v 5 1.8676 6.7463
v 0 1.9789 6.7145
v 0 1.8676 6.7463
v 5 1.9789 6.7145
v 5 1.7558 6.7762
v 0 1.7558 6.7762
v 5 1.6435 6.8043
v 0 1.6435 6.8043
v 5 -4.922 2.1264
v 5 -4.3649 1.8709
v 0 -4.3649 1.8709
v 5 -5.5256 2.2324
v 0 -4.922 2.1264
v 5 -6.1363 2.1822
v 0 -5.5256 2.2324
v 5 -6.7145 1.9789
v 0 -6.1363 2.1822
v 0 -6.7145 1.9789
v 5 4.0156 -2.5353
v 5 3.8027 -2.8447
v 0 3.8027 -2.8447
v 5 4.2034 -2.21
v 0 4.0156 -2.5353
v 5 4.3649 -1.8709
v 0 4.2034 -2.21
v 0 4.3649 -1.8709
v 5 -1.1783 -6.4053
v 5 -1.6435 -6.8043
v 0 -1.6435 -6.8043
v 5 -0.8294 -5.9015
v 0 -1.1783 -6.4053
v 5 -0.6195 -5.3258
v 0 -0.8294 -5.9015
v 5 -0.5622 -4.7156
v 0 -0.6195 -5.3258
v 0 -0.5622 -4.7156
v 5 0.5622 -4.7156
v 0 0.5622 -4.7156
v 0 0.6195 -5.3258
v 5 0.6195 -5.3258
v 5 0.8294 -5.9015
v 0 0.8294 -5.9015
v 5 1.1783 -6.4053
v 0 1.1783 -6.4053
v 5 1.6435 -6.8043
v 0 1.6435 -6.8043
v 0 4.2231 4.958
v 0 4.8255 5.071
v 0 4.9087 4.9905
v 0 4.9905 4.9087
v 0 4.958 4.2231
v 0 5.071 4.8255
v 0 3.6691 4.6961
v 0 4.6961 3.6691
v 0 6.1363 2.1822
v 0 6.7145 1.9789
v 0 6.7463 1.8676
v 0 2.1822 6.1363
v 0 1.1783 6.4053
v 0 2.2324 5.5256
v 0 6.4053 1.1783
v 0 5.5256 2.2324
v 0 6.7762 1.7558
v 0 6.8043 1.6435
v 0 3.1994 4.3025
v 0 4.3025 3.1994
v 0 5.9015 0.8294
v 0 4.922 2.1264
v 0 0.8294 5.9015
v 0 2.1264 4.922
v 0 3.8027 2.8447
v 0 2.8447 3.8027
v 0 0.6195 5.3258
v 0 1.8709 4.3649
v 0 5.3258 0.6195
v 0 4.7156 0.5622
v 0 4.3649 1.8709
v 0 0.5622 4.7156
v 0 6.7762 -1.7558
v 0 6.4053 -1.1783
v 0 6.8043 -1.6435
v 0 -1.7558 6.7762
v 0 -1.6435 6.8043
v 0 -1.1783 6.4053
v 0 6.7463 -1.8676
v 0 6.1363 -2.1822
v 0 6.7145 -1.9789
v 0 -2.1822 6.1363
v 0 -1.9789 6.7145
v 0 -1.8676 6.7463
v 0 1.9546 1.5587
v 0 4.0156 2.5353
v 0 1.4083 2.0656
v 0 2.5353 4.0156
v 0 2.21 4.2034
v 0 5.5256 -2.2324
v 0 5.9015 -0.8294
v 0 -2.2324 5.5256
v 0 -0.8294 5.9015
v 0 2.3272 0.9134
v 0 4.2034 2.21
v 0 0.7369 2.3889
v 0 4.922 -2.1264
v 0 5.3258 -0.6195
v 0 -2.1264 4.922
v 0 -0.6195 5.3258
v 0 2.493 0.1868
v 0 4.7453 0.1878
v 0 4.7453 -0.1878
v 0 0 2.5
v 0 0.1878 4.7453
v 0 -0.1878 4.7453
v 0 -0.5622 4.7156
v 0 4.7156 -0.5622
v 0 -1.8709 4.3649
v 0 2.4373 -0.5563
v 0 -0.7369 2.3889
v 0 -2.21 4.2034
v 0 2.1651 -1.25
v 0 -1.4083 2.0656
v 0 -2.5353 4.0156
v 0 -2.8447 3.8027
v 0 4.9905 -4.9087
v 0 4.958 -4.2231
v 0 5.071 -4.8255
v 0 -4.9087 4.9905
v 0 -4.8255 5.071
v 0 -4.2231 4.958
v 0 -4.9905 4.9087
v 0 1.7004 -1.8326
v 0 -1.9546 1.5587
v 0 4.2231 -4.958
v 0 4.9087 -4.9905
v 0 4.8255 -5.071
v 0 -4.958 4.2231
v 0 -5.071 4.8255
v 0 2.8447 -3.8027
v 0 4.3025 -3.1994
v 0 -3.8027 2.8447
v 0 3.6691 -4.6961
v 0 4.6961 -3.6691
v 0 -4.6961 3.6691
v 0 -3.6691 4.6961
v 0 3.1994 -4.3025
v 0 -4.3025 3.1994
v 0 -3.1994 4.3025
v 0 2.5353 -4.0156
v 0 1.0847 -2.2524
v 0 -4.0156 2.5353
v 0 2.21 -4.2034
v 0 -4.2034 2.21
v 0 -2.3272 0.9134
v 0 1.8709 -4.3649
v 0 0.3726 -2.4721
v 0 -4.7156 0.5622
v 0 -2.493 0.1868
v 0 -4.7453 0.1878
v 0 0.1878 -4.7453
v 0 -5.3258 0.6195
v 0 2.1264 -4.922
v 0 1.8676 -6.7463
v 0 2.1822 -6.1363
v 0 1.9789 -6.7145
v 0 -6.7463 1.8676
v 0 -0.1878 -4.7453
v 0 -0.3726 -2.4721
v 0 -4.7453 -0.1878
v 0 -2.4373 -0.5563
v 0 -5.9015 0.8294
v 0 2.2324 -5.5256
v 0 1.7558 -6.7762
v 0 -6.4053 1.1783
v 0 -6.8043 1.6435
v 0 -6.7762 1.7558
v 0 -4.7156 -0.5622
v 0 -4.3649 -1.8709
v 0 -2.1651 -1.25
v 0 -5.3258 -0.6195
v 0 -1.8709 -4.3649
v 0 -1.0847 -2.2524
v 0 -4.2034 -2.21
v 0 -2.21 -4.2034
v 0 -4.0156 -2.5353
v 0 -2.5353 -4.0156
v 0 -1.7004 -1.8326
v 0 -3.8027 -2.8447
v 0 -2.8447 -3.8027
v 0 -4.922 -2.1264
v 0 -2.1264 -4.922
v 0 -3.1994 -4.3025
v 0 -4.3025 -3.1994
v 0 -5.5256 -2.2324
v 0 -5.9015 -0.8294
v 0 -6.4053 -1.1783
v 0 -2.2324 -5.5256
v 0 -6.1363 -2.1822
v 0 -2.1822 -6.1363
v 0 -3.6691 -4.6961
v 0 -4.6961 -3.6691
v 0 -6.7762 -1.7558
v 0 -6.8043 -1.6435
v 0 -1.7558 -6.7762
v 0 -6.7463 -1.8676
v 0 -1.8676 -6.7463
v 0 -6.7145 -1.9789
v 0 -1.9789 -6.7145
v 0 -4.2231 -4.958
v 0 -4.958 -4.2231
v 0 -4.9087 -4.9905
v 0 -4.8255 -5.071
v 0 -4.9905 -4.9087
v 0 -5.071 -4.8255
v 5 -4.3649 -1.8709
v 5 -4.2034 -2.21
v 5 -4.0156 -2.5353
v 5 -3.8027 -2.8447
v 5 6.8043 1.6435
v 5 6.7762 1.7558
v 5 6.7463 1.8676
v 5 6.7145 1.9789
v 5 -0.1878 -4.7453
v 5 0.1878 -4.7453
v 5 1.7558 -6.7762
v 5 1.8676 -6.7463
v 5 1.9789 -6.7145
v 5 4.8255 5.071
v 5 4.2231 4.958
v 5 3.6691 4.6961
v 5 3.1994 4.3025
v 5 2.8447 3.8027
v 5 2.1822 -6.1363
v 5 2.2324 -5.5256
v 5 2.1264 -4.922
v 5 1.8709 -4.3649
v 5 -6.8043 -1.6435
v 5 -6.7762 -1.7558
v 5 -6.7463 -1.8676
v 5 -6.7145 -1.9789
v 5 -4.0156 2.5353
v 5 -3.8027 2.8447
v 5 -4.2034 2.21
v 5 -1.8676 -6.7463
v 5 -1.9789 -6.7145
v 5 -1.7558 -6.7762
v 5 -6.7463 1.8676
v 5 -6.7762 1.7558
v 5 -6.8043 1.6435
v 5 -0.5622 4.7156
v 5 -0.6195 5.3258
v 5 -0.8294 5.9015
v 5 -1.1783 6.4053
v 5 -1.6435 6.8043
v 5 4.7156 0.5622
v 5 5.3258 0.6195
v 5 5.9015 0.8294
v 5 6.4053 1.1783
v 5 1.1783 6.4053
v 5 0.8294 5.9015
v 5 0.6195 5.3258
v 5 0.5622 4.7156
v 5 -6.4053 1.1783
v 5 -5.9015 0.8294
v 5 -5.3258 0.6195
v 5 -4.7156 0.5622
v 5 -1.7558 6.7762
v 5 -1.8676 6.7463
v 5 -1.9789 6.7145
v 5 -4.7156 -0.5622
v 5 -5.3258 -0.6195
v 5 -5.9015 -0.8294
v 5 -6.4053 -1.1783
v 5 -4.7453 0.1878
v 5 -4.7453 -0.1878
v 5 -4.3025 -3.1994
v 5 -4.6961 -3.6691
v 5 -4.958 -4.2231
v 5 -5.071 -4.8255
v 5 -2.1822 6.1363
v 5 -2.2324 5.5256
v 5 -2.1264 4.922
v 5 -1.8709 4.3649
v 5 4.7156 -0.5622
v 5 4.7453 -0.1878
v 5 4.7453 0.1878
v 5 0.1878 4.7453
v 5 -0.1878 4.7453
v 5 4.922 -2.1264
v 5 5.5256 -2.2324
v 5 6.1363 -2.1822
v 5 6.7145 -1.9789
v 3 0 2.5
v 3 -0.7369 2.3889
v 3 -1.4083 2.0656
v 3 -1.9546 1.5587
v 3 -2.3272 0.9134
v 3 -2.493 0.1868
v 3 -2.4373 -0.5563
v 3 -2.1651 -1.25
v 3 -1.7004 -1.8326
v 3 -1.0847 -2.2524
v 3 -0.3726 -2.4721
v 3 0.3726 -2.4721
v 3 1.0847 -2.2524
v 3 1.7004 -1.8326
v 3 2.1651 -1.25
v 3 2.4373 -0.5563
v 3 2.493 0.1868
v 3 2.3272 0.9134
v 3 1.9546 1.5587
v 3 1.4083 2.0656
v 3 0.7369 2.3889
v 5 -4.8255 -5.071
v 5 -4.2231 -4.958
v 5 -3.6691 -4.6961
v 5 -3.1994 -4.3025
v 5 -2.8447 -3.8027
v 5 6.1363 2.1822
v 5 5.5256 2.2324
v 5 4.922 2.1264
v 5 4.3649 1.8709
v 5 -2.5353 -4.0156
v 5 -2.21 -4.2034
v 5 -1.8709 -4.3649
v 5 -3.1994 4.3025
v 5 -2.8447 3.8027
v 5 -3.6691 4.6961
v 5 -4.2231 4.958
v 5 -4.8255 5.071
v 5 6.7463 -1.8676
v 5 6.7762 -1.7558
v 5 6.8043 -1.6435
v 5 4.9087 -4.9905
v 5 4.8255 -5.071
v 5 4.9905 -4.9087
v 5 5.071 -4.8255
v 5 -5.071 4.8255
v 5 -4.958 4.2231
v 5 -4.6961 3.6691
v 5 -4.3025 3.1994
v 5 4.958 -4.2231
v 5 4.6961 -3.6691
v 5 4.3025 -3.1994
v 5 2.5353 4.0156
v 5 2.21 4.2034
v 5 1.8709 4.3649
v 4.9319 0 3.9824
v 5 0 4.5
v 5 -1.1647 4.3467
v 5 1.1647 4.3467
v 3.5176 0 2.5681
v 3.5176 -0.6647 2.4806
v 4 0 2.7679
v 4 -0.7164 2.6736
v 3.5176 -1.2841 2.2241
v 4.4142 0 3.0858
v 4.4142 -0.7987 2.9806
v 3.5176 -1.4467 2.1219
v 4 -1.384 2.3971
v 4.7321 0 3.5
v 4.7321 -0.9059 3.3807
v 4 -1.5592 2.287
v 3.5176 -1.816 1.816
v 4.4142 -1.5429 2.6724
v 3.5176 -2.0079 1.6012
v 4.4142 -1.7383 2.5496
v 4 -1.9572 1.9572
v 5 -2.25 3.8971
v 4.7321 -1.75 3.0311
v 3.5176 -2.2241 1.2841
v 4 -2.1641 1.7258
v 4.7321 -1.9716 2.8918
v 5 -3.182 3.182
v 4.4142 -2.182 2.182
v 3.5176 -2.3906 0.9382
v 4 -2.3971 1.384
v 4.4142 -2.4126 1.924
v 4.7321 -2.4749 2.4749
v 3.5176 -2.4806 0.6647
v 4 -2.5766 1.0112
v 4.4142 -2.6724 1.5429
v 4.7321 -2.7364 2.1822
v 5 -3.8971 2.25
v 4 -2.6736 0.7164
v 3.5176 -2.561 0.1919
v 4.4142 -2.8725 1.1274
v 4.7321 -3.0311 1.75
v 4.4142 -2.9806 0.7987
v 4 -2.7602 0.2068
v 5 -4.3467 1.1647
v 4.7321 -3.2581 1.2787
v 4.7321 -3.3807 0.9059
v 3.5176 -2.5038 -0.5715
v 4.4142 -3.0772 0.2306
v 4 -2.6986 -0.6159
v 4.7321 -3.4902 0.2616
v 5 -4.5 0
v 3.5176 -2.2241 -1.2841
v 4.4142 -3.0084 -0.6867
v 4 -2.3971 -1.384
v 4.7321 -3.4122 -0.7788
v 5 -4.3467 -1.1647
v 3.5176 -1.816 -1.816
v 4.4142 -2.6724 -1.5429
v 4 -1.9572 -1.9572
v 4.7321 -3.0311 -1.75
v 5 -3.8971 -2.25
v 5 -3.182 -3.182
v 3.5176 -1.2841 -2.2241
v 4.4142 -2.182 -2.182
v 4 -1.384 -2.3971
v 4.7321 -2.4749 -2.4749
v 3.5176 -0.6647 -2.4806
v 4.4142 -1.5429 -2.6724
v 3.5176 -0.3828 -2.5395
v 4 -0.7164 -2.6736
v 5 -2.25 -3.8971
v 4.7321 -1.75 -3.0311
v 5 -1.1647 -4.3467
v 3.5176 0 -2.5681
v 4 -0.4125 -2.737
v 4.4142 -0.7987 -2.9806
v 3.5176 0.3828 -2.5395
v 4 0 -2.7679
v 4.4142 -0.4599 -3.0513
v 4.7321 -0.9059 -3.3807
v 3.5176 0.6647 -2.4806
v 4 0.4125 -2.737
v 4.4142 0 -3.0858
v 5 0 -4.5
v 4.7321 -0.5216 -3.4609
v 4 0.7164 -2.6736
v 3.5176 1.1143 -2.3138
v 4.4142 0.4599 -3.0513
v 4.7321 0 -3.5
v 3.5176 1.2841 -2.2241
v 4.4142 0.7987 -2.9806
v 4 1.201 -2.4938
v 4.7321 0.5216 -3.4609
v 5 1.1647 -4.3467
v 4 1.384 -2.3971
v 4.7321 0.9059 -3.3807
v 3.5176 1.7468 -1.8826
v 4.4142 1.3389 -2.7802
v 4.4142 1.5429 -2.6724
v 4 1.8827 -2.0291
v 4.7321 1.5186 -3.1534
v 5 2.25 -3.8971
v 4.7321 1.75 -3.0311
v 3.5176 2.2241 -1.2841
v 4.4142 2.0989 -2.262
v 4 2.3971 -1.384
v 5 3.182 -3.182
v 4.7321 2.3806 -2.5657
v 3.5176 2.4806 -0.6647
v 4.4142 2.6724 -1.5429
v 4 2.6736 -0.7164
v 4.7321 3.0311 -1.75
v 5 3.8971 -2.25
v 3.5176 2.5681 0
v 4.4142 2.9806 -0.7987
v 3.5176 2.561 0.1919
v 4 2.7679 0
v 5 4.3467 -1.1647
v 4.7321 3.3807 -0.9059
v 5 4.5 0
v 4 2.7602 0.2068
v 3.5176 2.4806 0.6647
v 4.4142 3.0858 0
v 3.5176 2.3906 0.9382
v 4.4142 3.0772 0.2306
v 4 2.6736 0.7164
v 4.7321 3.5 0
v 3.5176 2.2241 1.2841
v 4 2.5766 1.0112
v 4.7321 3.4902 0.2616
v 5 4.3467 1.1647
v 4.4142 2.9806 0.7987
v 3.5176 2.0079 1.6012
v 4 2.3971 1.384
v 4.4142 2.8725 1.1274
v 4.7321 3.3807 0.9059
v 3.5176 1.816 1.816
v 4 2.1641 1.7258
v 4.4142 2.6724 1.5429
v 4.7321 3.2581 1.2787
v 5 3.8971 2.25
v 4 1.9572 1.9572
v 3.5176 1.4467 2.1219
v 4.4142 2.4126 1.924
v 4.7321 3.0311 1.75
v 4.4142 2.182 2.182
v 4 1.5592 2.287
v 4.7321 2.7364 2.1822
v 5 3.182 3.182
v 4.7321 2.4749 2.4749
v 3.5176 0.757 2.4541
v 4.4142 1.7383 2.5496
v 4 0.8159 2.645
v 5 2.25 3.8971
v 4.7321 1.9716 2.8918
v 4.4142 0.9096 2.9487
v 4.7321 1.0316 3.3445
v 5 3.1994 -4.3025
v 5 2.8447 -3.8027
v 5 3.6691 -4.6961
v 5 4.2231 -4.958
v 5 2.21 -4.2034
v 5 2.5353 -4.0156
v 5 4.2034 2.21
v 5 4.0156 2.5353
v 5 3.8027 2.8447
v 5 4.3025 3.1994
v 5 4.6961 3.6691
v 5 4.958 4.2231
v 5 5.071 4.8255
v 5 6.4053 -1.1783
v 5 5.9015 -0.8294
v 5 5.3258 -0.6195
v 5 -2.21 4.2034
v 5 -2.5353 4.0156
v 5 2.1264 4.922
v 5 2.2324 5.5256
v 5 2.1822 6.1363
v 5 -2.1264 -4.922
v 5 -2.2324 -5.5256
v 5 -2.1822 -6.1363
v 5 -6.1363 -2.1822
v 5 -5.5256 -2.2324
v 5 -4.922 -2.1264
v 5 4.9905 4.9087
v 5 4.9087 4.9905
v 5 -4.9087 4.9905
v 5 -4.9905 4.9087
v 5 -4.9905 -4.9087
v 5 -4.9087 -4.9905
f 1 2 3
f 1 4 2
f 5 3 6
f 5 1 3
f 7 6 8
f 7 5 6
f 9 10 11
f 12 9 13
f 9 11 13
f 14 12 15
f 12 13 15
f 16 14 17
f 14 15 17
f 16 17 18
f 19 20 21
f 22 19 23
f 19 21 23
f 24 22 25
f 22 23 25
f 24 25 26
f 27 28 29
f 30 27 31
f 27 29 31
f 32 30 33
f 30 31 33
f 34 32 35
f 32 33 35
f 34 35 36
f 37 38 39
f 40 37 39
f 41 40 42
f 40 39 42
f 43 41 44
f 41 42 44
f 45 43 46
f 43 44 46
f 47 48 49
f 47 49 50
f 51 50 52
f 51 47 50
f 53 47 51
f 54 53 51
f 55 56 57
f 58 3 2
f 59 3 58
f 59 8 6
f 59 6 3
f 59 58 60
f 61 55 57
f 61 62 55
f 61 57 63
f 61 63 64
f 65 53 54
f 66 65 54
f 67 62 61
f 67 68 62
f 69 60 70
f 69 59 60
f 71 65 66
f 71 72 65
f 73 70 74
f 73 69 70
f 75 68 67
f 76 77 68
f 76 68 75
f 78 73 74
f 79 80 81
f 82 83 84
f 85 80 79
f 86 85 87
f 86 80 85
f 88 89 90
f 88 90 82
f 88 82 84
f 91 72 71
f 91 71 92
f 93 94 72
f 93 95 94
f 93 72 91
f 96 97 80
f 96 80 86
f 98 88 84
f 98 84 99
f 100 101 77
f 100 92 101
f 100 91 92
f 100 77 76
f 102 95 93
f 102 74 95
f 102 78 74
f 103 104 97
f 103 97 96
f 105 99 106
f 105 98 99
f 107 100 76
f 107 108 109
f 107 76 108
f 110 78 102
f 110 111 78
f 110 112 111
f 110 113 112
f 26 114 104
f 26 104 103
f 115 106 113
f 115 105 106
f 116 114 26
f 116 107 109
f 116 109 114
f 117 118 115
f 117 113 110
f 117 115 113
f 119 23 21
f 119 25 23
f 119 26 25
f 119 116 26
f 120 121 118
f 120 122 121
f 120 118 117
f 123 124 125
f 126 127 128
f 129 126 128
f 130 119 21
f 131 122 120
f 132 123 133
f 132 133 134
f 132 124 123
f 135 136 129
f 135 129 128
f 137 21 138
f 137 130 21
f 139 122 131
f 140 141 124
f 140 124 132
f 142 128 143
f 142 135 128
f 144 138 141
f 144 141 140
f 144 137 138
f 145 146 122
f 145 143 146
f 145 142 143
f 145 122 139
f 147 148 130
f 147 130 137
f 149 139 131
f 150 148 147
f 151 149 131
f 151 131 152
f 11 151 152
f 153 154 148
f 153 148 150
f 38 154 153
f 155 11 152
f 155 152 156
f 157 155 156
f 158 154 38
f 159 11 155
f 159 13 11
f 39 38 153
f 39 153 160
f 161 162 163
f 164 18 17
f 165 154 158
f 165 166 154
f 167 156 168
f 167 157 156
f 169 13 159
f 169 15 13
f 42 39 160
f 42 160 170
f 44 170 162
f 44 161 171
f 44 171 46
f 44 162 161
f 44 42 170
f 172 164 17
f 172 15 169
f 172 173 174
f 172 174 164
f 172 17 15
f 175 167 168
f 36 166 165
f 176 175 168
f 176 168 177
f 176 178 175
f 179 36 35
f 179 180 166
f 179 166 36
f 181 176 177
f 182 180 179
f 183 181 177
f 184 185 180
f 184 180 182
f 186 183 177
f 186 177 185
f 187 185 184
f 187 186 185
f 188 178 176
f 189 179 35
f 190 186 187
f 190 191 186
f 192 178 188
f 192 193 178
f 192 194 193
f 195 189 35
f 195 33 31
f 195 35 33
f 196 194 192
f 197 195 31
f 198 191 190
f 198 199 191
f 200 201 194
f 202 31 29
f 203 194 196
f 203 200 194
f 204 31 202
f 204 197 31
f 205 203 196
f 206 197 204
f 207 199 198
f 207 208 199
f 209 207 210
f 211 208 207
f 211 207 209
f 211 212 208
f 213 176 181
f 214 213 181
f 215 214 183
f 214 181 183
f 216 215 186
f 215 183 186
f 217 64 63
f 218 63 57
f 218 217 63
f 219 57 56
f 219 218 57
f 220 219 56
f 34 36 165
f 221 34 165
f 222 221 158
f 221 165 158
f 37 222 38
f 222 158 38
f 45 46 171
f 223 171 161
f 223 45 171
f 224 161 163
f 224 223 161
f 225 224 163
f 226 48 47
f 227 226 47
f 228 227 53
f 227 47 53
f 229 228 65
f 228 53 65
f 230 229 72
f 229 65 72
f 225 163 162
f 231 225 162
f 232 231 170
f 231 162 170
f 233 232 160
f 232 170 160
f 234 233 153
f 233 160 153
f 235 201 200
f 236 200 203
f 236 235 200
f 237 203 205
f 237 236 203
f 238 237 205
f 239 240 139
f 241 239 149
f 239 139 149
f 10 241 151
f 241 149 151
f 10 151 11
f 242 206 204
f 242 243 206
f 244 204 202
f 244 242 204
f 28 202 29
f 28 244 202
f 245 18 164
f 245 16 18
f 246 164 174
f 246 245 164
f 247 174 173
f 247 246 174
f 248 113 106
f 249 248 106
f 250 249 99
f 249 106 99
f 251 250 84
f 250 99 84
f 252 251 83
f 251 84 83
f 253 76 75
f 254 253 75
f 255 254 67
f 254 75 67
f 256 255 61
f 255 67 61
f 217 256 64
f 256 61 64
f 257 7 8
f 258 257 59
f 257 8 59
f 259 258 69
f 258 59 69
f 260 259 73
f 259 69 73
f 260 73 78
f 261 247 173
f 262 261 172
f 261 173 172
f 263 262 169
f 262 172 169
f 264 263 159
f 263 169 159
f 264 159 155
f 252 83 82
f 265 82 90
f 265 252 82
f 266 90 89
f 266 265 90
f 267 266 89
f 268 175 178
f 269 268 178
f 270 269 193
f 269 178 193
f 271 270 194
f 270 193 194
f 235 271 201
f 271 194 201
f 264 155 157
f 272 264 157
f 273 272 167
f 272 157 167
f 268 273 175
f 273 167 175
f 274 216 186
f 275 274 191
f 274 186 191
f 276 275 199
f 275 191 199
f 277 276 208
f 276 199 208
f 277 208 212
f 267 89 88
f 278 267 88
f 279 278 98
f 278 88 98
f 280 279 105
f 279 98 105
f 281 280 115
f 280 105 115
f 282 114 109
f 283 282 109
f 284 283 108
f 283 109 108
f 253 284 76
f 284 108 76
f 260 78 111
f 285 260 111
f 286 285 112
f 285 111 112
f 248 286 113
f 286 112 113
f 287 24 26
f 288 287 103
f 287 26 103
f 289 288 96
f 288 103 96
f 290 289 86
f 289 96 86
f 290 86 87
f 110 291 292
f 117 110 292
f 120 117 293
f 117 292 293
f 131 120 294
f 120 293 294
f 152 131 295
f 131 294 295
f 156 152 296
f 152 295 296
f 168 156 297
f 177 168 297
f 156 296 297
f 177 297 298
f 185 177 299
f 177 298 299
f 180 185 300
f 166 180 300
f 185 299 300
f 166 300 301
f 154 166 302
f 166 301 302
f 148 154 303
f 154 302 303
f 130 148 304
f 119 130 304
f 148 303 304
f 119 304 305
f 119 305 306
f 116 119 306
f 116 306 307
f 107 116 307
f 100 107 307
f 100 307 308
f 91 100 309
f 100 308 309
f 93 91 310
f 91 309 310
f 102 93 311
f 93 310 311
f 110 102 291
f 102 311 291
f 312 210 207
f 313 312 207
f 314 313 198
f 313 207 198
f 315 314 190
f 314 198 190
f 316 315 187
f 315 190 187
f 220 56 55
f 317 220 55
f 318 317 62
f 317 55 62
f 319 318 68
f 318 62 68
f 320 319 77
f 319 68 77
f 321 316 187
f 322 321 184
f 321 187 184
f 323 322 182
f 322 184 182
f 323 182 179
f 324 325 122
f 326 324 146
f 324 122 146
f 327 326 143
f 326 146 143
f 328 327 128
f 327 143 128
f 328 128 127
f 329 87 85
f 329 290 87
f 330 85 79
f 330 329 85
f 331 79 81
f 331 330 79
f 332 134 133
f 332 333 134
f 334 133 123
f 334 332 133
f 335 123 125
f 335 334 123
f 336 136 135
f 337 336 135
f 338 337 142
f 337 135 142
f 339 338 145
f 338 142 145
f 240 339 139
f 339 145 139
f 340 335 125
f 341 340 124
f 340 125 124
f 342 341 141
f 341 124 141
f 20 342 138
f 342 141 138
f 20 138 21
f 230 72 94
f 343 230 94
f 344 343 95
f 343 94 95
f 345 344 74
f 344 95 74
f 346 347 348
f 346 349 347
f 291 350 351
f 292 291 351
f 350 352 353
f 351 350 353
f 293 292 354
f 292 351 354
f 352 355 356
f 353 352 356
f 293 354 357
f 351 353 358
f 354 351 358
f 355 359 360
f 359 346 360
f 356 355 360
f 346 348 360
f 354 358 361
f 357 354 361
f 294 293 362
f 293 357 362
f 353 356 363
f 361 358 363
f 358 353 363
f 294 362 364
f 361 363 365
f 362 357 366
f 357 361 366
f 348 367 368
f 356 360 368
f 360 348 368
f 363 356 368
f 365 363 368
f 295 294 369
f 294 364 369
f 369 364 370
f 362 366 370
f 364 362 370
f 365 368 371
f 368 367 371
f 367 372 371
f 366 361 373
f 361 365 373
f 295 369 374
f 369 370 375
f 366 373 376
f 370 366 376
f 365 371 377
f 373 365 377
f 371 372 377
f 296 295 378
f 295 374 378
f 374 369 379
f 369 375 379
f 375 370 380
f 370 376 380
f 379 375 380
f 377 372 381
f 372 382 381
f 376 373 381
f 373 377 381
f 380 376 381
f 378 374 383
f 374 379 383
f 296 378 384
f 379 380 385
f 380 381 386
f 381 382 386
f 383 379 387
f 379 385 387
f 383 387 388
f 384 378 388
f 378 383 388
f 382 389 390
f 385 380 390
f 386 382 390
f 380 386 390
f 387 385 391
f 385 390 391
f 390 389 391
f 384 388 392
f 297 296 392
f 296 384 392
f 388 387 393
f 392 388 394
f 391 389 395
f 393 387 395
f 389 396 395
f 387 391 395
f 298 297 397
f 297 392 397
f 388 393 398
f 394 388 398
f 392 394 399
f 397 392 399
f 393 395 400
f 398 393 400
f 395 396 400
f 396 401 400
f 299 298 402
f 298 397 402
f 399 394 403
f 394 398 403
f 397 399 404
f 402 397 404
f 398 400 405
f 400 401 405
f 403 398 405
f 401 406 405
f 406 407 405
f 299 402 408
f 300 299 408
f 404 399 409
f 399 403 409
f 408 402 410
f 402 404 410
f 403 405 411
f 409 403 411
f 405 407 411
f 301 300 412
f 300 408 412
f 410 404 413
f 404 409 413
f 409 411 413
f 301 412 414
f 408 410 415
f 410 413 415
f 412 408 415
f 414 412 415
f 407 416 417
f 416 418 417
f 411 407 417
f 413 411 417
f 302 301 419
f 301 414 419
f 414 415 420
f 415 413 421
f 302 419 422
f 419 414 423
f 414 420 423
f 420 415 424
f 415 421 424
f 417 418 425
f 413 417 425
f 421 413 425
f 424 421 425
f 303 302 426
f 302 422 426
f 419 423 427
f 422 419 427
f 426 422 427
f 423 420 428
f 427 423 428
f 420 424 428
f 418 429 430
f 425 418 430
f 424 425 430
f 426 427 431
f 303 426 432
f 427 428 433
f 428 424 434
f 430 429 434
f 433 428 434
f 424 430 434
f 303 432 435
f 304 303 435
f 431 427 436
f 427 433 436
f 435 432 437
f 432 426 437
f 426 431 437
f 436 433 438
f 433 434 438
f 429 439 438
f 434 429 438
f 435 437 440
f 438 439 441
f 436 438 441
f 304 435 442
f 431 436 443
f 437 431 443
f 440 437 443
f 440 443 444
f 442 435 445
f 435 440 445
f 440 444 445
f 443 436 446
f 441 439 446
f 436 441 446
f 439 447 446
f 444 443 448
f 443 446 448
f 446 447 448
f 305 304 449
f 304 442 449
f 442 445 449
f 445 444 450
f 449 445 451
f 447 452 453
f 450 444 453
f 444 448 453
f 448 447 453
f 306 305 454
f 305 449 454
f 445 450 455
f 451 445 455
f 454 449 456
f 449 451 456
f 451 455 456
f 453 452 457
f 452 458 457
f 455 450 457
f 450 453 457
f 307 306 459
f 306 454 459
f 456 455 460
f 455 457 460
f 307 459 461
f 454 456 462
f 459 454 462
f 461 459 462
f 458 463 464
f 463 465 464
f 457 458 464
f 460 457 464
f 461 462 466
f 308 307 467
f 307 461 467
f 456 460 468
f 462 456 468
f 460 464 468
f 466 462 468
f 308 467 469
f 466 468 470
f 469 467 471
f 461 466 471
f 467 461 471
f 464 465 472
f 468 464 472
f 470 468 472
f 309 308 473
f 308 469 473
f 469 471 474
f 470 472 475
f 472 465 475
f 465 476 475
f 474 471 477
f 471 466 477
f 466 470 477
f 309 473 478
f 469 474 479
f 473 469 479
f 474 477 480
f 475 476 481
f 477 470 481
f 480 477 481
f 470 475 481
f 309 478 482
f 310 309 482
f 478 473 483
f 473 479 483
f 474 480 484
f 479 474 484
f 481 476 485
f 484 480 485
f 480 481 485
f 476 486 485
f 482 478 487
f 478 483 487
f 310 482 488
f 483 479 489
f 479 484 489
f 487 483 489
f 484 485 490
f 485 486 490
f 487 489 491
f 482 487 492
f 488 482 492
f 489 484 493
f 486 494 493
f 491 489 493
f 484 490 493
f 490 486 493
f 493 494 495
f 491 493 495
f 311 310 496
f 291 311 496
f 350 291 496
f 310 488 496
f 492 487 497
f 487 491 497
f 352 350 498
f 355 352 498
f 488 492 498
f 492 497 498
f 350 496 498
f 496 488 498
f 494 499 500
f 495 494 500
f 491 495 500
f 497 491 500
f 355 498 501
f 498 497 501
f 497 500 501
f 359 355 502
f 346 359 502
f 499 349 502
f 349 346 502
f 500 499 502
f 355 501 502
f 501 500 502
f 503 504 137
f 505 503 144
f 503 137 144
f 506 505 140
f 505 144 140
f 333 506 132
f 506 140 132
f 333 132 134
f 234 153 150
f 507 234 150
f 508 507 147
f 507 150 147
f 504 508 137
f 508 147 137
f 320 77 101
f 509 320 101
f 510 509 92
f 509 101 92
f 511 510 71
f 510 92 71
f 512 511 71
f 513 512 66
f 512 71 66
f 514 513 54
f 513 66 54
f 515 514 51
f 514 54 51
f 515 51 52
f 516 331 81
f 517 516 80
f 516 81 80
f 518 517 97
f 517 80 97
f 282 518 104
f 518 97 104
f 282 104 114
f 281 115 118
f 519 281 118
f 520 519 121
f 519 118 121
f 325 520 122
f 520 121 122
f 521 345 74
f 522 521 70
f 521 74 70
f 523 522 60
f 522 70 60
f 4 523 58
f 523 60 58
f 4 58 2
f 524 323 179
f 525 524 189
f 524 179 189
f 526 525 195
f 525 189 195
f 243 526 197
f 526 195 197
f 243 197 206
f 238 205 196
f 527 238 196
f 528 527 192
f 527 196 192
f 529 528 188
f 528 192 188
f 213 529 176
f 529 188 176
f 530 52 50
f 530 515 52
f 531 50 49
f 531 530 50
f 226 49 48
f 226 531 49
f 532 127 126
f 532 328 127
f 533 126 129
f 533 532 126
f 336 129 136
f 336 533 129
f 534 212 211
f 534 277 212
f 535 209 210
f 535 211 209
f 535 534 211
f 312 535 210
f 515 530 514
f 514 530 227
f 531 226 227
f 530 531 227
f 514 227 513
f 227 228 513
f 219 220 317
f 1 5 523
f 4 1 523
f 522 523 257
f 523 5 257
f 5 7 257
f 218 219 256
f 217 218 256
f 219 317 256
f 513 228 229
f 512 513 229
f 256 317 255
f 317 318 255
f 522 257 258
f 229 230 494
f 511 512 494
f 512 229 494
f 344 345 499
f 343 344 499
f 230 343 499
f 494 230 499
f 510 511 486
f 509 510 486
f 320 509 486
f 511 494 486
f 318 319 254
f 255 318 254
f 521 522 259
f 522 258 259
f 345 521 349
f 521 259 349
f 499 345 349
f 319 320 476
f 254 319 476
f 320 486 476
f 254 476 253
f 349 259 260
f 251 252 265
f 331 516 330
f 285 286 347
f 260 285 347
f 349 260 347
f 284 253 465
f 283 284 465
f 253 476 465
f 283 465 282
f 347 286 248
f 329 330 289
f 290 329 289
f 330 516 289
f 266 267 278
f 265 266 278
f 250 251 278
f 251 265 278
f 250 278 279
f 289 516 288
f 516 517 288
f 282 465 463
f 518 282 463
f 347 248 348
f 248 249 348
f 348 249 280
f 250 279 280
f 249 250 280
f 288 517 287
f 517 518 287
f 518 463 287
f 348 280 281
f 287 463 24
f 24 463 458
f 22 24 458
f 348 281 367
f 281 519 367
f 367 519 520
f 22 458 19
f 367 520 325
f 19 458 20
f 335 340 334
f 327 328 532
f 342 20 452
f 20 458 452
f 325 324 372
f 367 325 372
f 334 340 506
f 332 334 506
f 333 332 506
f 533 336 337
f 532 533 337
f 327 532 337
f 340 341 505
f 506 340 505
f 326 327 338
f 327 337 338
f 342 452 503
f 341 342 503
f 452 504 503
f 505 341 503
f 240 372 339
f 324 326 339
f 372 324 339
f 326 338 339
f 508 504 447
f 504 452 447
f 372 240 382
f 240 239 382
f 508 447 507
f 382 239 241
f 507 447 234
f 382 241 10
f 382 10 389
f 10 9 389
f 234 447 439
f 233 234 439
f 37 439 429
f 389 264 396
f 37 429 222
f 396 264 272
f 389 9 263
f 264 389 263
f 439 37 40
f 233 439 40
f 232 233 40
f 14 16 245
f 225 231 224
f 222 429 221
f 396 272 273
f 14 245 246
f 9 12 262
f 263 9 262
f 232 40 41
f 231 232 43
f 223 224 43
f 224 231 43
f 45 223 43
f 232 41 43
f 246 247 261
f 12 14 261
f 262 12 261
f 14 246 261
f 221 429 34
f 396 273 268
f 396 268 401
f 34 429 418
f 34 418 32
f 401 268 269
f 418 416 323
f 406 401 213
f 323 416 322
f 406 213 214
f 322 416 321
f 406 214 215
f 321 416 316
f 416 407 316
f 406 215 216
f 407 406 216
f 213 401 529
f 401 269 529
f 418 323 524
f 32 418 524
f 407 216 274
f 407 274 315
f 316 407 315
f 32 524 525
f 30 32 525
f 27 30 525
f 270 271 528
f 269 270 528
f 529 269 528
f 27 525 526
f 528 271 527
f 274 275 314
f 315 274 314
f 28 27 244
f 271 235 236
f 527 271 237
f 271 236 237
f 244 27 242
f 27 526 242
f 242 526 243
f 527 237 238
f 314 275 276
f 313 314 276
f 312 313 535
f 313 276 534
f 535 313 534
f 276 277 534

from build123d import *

# Parameters (mm, degrees)
BASPROSKE_W     = 5
BASPROSKE_H     = 7
TOOTHCUT_DEPTH  = 12.090536506
TEETHCUTS_COUNT = 12
TEETHCUTS_ANGLE = 330
BORSKE_R        = 2.5
BORE_DEPTH      = 50.0000508
REDONDEO1_R     = 2


with BuildPart() as part:
    # BasProSke → Base-Revolve (revolve)
    with BuildSketch(Plane(origin=(0, 0, 0), x_dir=(1, 0, 0), z_dir=(0, 1, 0)), mode=Mode.PRIVATE) as base_revolve_sk:
        with Locations((2.5, 3.5)):
            Rectangle(BASPROSKE_W, BASPROSKE_H)
    revolve(base_revolve_sk.sketch.rotate(Axis((-10, 0, 0), (1, 0, 0)), 180), axis=Axis((-10, 0, 0), (1, 0, 0)))

    # TooCutSke → ToothCut (cut, through all)
    with BuildSketch(Plane(origin=(0, 0, 0), x_dir=(0, 0, -1), z_dir=(1, 0, 0))):
        with BuildLine():
            ThreePointArc((0.562207301, 4.715604304), (0, 4.749), (-0.562207301, 4.715604304))
            ThreePointArc((-0.562207301, 4.715604304), (-0.837528627, 5.917009812), (-1.672850686, 6.823328788))
            ThreePointArc((-1.672850686, 6.823328788), (0, 7.0254), (1.672850686, 6.823328788))
            ThreePointArc((1.672850686, 6.823328788), (0.837528627, 5.917009812), (0.562207301, 4.715604304))
        make_face()
    toothcut = extrude(amount=TOOTHCUT_DEPTH, mode=Mode.SUBTRACT)

    # TeethCuts: ToothCut ×12 about axis
    teethcuts_axis = Axis((-10, 0, 0), (1, 0, 0))
    for i in range(1, TEETHCUTS_COUNT):
        add(toothcut.rotate(teethcuts_axis, i * TEETHCUTS_ANGLE / (TEETHCUTS_COUNT - 1)), mode=Mode.SUBTRACT)

    # BorSke → Bore (cut, symmetric)
    with BuildSketch(Plane(origin=(0, 0, 0), x_dir=(0, 0, -1), z_dir=(1, 0, 0))):
        with Locations(Location((0, 0, 0), (0, 0, 180))):
            Circle(BORSKE_R)
    extrude(amount=BORE_DEPTH, both=True, mode=Mode.SUBTRACT)

    # Redondeo1
    redondeo1_edges = [part.edges().sort_by_distance(p)[0] for p in [
        (5, 0, -2.5),
    ]]
    fillet(redondeo1_edges, radius=REDONDEO1_R)


solid = part.part
